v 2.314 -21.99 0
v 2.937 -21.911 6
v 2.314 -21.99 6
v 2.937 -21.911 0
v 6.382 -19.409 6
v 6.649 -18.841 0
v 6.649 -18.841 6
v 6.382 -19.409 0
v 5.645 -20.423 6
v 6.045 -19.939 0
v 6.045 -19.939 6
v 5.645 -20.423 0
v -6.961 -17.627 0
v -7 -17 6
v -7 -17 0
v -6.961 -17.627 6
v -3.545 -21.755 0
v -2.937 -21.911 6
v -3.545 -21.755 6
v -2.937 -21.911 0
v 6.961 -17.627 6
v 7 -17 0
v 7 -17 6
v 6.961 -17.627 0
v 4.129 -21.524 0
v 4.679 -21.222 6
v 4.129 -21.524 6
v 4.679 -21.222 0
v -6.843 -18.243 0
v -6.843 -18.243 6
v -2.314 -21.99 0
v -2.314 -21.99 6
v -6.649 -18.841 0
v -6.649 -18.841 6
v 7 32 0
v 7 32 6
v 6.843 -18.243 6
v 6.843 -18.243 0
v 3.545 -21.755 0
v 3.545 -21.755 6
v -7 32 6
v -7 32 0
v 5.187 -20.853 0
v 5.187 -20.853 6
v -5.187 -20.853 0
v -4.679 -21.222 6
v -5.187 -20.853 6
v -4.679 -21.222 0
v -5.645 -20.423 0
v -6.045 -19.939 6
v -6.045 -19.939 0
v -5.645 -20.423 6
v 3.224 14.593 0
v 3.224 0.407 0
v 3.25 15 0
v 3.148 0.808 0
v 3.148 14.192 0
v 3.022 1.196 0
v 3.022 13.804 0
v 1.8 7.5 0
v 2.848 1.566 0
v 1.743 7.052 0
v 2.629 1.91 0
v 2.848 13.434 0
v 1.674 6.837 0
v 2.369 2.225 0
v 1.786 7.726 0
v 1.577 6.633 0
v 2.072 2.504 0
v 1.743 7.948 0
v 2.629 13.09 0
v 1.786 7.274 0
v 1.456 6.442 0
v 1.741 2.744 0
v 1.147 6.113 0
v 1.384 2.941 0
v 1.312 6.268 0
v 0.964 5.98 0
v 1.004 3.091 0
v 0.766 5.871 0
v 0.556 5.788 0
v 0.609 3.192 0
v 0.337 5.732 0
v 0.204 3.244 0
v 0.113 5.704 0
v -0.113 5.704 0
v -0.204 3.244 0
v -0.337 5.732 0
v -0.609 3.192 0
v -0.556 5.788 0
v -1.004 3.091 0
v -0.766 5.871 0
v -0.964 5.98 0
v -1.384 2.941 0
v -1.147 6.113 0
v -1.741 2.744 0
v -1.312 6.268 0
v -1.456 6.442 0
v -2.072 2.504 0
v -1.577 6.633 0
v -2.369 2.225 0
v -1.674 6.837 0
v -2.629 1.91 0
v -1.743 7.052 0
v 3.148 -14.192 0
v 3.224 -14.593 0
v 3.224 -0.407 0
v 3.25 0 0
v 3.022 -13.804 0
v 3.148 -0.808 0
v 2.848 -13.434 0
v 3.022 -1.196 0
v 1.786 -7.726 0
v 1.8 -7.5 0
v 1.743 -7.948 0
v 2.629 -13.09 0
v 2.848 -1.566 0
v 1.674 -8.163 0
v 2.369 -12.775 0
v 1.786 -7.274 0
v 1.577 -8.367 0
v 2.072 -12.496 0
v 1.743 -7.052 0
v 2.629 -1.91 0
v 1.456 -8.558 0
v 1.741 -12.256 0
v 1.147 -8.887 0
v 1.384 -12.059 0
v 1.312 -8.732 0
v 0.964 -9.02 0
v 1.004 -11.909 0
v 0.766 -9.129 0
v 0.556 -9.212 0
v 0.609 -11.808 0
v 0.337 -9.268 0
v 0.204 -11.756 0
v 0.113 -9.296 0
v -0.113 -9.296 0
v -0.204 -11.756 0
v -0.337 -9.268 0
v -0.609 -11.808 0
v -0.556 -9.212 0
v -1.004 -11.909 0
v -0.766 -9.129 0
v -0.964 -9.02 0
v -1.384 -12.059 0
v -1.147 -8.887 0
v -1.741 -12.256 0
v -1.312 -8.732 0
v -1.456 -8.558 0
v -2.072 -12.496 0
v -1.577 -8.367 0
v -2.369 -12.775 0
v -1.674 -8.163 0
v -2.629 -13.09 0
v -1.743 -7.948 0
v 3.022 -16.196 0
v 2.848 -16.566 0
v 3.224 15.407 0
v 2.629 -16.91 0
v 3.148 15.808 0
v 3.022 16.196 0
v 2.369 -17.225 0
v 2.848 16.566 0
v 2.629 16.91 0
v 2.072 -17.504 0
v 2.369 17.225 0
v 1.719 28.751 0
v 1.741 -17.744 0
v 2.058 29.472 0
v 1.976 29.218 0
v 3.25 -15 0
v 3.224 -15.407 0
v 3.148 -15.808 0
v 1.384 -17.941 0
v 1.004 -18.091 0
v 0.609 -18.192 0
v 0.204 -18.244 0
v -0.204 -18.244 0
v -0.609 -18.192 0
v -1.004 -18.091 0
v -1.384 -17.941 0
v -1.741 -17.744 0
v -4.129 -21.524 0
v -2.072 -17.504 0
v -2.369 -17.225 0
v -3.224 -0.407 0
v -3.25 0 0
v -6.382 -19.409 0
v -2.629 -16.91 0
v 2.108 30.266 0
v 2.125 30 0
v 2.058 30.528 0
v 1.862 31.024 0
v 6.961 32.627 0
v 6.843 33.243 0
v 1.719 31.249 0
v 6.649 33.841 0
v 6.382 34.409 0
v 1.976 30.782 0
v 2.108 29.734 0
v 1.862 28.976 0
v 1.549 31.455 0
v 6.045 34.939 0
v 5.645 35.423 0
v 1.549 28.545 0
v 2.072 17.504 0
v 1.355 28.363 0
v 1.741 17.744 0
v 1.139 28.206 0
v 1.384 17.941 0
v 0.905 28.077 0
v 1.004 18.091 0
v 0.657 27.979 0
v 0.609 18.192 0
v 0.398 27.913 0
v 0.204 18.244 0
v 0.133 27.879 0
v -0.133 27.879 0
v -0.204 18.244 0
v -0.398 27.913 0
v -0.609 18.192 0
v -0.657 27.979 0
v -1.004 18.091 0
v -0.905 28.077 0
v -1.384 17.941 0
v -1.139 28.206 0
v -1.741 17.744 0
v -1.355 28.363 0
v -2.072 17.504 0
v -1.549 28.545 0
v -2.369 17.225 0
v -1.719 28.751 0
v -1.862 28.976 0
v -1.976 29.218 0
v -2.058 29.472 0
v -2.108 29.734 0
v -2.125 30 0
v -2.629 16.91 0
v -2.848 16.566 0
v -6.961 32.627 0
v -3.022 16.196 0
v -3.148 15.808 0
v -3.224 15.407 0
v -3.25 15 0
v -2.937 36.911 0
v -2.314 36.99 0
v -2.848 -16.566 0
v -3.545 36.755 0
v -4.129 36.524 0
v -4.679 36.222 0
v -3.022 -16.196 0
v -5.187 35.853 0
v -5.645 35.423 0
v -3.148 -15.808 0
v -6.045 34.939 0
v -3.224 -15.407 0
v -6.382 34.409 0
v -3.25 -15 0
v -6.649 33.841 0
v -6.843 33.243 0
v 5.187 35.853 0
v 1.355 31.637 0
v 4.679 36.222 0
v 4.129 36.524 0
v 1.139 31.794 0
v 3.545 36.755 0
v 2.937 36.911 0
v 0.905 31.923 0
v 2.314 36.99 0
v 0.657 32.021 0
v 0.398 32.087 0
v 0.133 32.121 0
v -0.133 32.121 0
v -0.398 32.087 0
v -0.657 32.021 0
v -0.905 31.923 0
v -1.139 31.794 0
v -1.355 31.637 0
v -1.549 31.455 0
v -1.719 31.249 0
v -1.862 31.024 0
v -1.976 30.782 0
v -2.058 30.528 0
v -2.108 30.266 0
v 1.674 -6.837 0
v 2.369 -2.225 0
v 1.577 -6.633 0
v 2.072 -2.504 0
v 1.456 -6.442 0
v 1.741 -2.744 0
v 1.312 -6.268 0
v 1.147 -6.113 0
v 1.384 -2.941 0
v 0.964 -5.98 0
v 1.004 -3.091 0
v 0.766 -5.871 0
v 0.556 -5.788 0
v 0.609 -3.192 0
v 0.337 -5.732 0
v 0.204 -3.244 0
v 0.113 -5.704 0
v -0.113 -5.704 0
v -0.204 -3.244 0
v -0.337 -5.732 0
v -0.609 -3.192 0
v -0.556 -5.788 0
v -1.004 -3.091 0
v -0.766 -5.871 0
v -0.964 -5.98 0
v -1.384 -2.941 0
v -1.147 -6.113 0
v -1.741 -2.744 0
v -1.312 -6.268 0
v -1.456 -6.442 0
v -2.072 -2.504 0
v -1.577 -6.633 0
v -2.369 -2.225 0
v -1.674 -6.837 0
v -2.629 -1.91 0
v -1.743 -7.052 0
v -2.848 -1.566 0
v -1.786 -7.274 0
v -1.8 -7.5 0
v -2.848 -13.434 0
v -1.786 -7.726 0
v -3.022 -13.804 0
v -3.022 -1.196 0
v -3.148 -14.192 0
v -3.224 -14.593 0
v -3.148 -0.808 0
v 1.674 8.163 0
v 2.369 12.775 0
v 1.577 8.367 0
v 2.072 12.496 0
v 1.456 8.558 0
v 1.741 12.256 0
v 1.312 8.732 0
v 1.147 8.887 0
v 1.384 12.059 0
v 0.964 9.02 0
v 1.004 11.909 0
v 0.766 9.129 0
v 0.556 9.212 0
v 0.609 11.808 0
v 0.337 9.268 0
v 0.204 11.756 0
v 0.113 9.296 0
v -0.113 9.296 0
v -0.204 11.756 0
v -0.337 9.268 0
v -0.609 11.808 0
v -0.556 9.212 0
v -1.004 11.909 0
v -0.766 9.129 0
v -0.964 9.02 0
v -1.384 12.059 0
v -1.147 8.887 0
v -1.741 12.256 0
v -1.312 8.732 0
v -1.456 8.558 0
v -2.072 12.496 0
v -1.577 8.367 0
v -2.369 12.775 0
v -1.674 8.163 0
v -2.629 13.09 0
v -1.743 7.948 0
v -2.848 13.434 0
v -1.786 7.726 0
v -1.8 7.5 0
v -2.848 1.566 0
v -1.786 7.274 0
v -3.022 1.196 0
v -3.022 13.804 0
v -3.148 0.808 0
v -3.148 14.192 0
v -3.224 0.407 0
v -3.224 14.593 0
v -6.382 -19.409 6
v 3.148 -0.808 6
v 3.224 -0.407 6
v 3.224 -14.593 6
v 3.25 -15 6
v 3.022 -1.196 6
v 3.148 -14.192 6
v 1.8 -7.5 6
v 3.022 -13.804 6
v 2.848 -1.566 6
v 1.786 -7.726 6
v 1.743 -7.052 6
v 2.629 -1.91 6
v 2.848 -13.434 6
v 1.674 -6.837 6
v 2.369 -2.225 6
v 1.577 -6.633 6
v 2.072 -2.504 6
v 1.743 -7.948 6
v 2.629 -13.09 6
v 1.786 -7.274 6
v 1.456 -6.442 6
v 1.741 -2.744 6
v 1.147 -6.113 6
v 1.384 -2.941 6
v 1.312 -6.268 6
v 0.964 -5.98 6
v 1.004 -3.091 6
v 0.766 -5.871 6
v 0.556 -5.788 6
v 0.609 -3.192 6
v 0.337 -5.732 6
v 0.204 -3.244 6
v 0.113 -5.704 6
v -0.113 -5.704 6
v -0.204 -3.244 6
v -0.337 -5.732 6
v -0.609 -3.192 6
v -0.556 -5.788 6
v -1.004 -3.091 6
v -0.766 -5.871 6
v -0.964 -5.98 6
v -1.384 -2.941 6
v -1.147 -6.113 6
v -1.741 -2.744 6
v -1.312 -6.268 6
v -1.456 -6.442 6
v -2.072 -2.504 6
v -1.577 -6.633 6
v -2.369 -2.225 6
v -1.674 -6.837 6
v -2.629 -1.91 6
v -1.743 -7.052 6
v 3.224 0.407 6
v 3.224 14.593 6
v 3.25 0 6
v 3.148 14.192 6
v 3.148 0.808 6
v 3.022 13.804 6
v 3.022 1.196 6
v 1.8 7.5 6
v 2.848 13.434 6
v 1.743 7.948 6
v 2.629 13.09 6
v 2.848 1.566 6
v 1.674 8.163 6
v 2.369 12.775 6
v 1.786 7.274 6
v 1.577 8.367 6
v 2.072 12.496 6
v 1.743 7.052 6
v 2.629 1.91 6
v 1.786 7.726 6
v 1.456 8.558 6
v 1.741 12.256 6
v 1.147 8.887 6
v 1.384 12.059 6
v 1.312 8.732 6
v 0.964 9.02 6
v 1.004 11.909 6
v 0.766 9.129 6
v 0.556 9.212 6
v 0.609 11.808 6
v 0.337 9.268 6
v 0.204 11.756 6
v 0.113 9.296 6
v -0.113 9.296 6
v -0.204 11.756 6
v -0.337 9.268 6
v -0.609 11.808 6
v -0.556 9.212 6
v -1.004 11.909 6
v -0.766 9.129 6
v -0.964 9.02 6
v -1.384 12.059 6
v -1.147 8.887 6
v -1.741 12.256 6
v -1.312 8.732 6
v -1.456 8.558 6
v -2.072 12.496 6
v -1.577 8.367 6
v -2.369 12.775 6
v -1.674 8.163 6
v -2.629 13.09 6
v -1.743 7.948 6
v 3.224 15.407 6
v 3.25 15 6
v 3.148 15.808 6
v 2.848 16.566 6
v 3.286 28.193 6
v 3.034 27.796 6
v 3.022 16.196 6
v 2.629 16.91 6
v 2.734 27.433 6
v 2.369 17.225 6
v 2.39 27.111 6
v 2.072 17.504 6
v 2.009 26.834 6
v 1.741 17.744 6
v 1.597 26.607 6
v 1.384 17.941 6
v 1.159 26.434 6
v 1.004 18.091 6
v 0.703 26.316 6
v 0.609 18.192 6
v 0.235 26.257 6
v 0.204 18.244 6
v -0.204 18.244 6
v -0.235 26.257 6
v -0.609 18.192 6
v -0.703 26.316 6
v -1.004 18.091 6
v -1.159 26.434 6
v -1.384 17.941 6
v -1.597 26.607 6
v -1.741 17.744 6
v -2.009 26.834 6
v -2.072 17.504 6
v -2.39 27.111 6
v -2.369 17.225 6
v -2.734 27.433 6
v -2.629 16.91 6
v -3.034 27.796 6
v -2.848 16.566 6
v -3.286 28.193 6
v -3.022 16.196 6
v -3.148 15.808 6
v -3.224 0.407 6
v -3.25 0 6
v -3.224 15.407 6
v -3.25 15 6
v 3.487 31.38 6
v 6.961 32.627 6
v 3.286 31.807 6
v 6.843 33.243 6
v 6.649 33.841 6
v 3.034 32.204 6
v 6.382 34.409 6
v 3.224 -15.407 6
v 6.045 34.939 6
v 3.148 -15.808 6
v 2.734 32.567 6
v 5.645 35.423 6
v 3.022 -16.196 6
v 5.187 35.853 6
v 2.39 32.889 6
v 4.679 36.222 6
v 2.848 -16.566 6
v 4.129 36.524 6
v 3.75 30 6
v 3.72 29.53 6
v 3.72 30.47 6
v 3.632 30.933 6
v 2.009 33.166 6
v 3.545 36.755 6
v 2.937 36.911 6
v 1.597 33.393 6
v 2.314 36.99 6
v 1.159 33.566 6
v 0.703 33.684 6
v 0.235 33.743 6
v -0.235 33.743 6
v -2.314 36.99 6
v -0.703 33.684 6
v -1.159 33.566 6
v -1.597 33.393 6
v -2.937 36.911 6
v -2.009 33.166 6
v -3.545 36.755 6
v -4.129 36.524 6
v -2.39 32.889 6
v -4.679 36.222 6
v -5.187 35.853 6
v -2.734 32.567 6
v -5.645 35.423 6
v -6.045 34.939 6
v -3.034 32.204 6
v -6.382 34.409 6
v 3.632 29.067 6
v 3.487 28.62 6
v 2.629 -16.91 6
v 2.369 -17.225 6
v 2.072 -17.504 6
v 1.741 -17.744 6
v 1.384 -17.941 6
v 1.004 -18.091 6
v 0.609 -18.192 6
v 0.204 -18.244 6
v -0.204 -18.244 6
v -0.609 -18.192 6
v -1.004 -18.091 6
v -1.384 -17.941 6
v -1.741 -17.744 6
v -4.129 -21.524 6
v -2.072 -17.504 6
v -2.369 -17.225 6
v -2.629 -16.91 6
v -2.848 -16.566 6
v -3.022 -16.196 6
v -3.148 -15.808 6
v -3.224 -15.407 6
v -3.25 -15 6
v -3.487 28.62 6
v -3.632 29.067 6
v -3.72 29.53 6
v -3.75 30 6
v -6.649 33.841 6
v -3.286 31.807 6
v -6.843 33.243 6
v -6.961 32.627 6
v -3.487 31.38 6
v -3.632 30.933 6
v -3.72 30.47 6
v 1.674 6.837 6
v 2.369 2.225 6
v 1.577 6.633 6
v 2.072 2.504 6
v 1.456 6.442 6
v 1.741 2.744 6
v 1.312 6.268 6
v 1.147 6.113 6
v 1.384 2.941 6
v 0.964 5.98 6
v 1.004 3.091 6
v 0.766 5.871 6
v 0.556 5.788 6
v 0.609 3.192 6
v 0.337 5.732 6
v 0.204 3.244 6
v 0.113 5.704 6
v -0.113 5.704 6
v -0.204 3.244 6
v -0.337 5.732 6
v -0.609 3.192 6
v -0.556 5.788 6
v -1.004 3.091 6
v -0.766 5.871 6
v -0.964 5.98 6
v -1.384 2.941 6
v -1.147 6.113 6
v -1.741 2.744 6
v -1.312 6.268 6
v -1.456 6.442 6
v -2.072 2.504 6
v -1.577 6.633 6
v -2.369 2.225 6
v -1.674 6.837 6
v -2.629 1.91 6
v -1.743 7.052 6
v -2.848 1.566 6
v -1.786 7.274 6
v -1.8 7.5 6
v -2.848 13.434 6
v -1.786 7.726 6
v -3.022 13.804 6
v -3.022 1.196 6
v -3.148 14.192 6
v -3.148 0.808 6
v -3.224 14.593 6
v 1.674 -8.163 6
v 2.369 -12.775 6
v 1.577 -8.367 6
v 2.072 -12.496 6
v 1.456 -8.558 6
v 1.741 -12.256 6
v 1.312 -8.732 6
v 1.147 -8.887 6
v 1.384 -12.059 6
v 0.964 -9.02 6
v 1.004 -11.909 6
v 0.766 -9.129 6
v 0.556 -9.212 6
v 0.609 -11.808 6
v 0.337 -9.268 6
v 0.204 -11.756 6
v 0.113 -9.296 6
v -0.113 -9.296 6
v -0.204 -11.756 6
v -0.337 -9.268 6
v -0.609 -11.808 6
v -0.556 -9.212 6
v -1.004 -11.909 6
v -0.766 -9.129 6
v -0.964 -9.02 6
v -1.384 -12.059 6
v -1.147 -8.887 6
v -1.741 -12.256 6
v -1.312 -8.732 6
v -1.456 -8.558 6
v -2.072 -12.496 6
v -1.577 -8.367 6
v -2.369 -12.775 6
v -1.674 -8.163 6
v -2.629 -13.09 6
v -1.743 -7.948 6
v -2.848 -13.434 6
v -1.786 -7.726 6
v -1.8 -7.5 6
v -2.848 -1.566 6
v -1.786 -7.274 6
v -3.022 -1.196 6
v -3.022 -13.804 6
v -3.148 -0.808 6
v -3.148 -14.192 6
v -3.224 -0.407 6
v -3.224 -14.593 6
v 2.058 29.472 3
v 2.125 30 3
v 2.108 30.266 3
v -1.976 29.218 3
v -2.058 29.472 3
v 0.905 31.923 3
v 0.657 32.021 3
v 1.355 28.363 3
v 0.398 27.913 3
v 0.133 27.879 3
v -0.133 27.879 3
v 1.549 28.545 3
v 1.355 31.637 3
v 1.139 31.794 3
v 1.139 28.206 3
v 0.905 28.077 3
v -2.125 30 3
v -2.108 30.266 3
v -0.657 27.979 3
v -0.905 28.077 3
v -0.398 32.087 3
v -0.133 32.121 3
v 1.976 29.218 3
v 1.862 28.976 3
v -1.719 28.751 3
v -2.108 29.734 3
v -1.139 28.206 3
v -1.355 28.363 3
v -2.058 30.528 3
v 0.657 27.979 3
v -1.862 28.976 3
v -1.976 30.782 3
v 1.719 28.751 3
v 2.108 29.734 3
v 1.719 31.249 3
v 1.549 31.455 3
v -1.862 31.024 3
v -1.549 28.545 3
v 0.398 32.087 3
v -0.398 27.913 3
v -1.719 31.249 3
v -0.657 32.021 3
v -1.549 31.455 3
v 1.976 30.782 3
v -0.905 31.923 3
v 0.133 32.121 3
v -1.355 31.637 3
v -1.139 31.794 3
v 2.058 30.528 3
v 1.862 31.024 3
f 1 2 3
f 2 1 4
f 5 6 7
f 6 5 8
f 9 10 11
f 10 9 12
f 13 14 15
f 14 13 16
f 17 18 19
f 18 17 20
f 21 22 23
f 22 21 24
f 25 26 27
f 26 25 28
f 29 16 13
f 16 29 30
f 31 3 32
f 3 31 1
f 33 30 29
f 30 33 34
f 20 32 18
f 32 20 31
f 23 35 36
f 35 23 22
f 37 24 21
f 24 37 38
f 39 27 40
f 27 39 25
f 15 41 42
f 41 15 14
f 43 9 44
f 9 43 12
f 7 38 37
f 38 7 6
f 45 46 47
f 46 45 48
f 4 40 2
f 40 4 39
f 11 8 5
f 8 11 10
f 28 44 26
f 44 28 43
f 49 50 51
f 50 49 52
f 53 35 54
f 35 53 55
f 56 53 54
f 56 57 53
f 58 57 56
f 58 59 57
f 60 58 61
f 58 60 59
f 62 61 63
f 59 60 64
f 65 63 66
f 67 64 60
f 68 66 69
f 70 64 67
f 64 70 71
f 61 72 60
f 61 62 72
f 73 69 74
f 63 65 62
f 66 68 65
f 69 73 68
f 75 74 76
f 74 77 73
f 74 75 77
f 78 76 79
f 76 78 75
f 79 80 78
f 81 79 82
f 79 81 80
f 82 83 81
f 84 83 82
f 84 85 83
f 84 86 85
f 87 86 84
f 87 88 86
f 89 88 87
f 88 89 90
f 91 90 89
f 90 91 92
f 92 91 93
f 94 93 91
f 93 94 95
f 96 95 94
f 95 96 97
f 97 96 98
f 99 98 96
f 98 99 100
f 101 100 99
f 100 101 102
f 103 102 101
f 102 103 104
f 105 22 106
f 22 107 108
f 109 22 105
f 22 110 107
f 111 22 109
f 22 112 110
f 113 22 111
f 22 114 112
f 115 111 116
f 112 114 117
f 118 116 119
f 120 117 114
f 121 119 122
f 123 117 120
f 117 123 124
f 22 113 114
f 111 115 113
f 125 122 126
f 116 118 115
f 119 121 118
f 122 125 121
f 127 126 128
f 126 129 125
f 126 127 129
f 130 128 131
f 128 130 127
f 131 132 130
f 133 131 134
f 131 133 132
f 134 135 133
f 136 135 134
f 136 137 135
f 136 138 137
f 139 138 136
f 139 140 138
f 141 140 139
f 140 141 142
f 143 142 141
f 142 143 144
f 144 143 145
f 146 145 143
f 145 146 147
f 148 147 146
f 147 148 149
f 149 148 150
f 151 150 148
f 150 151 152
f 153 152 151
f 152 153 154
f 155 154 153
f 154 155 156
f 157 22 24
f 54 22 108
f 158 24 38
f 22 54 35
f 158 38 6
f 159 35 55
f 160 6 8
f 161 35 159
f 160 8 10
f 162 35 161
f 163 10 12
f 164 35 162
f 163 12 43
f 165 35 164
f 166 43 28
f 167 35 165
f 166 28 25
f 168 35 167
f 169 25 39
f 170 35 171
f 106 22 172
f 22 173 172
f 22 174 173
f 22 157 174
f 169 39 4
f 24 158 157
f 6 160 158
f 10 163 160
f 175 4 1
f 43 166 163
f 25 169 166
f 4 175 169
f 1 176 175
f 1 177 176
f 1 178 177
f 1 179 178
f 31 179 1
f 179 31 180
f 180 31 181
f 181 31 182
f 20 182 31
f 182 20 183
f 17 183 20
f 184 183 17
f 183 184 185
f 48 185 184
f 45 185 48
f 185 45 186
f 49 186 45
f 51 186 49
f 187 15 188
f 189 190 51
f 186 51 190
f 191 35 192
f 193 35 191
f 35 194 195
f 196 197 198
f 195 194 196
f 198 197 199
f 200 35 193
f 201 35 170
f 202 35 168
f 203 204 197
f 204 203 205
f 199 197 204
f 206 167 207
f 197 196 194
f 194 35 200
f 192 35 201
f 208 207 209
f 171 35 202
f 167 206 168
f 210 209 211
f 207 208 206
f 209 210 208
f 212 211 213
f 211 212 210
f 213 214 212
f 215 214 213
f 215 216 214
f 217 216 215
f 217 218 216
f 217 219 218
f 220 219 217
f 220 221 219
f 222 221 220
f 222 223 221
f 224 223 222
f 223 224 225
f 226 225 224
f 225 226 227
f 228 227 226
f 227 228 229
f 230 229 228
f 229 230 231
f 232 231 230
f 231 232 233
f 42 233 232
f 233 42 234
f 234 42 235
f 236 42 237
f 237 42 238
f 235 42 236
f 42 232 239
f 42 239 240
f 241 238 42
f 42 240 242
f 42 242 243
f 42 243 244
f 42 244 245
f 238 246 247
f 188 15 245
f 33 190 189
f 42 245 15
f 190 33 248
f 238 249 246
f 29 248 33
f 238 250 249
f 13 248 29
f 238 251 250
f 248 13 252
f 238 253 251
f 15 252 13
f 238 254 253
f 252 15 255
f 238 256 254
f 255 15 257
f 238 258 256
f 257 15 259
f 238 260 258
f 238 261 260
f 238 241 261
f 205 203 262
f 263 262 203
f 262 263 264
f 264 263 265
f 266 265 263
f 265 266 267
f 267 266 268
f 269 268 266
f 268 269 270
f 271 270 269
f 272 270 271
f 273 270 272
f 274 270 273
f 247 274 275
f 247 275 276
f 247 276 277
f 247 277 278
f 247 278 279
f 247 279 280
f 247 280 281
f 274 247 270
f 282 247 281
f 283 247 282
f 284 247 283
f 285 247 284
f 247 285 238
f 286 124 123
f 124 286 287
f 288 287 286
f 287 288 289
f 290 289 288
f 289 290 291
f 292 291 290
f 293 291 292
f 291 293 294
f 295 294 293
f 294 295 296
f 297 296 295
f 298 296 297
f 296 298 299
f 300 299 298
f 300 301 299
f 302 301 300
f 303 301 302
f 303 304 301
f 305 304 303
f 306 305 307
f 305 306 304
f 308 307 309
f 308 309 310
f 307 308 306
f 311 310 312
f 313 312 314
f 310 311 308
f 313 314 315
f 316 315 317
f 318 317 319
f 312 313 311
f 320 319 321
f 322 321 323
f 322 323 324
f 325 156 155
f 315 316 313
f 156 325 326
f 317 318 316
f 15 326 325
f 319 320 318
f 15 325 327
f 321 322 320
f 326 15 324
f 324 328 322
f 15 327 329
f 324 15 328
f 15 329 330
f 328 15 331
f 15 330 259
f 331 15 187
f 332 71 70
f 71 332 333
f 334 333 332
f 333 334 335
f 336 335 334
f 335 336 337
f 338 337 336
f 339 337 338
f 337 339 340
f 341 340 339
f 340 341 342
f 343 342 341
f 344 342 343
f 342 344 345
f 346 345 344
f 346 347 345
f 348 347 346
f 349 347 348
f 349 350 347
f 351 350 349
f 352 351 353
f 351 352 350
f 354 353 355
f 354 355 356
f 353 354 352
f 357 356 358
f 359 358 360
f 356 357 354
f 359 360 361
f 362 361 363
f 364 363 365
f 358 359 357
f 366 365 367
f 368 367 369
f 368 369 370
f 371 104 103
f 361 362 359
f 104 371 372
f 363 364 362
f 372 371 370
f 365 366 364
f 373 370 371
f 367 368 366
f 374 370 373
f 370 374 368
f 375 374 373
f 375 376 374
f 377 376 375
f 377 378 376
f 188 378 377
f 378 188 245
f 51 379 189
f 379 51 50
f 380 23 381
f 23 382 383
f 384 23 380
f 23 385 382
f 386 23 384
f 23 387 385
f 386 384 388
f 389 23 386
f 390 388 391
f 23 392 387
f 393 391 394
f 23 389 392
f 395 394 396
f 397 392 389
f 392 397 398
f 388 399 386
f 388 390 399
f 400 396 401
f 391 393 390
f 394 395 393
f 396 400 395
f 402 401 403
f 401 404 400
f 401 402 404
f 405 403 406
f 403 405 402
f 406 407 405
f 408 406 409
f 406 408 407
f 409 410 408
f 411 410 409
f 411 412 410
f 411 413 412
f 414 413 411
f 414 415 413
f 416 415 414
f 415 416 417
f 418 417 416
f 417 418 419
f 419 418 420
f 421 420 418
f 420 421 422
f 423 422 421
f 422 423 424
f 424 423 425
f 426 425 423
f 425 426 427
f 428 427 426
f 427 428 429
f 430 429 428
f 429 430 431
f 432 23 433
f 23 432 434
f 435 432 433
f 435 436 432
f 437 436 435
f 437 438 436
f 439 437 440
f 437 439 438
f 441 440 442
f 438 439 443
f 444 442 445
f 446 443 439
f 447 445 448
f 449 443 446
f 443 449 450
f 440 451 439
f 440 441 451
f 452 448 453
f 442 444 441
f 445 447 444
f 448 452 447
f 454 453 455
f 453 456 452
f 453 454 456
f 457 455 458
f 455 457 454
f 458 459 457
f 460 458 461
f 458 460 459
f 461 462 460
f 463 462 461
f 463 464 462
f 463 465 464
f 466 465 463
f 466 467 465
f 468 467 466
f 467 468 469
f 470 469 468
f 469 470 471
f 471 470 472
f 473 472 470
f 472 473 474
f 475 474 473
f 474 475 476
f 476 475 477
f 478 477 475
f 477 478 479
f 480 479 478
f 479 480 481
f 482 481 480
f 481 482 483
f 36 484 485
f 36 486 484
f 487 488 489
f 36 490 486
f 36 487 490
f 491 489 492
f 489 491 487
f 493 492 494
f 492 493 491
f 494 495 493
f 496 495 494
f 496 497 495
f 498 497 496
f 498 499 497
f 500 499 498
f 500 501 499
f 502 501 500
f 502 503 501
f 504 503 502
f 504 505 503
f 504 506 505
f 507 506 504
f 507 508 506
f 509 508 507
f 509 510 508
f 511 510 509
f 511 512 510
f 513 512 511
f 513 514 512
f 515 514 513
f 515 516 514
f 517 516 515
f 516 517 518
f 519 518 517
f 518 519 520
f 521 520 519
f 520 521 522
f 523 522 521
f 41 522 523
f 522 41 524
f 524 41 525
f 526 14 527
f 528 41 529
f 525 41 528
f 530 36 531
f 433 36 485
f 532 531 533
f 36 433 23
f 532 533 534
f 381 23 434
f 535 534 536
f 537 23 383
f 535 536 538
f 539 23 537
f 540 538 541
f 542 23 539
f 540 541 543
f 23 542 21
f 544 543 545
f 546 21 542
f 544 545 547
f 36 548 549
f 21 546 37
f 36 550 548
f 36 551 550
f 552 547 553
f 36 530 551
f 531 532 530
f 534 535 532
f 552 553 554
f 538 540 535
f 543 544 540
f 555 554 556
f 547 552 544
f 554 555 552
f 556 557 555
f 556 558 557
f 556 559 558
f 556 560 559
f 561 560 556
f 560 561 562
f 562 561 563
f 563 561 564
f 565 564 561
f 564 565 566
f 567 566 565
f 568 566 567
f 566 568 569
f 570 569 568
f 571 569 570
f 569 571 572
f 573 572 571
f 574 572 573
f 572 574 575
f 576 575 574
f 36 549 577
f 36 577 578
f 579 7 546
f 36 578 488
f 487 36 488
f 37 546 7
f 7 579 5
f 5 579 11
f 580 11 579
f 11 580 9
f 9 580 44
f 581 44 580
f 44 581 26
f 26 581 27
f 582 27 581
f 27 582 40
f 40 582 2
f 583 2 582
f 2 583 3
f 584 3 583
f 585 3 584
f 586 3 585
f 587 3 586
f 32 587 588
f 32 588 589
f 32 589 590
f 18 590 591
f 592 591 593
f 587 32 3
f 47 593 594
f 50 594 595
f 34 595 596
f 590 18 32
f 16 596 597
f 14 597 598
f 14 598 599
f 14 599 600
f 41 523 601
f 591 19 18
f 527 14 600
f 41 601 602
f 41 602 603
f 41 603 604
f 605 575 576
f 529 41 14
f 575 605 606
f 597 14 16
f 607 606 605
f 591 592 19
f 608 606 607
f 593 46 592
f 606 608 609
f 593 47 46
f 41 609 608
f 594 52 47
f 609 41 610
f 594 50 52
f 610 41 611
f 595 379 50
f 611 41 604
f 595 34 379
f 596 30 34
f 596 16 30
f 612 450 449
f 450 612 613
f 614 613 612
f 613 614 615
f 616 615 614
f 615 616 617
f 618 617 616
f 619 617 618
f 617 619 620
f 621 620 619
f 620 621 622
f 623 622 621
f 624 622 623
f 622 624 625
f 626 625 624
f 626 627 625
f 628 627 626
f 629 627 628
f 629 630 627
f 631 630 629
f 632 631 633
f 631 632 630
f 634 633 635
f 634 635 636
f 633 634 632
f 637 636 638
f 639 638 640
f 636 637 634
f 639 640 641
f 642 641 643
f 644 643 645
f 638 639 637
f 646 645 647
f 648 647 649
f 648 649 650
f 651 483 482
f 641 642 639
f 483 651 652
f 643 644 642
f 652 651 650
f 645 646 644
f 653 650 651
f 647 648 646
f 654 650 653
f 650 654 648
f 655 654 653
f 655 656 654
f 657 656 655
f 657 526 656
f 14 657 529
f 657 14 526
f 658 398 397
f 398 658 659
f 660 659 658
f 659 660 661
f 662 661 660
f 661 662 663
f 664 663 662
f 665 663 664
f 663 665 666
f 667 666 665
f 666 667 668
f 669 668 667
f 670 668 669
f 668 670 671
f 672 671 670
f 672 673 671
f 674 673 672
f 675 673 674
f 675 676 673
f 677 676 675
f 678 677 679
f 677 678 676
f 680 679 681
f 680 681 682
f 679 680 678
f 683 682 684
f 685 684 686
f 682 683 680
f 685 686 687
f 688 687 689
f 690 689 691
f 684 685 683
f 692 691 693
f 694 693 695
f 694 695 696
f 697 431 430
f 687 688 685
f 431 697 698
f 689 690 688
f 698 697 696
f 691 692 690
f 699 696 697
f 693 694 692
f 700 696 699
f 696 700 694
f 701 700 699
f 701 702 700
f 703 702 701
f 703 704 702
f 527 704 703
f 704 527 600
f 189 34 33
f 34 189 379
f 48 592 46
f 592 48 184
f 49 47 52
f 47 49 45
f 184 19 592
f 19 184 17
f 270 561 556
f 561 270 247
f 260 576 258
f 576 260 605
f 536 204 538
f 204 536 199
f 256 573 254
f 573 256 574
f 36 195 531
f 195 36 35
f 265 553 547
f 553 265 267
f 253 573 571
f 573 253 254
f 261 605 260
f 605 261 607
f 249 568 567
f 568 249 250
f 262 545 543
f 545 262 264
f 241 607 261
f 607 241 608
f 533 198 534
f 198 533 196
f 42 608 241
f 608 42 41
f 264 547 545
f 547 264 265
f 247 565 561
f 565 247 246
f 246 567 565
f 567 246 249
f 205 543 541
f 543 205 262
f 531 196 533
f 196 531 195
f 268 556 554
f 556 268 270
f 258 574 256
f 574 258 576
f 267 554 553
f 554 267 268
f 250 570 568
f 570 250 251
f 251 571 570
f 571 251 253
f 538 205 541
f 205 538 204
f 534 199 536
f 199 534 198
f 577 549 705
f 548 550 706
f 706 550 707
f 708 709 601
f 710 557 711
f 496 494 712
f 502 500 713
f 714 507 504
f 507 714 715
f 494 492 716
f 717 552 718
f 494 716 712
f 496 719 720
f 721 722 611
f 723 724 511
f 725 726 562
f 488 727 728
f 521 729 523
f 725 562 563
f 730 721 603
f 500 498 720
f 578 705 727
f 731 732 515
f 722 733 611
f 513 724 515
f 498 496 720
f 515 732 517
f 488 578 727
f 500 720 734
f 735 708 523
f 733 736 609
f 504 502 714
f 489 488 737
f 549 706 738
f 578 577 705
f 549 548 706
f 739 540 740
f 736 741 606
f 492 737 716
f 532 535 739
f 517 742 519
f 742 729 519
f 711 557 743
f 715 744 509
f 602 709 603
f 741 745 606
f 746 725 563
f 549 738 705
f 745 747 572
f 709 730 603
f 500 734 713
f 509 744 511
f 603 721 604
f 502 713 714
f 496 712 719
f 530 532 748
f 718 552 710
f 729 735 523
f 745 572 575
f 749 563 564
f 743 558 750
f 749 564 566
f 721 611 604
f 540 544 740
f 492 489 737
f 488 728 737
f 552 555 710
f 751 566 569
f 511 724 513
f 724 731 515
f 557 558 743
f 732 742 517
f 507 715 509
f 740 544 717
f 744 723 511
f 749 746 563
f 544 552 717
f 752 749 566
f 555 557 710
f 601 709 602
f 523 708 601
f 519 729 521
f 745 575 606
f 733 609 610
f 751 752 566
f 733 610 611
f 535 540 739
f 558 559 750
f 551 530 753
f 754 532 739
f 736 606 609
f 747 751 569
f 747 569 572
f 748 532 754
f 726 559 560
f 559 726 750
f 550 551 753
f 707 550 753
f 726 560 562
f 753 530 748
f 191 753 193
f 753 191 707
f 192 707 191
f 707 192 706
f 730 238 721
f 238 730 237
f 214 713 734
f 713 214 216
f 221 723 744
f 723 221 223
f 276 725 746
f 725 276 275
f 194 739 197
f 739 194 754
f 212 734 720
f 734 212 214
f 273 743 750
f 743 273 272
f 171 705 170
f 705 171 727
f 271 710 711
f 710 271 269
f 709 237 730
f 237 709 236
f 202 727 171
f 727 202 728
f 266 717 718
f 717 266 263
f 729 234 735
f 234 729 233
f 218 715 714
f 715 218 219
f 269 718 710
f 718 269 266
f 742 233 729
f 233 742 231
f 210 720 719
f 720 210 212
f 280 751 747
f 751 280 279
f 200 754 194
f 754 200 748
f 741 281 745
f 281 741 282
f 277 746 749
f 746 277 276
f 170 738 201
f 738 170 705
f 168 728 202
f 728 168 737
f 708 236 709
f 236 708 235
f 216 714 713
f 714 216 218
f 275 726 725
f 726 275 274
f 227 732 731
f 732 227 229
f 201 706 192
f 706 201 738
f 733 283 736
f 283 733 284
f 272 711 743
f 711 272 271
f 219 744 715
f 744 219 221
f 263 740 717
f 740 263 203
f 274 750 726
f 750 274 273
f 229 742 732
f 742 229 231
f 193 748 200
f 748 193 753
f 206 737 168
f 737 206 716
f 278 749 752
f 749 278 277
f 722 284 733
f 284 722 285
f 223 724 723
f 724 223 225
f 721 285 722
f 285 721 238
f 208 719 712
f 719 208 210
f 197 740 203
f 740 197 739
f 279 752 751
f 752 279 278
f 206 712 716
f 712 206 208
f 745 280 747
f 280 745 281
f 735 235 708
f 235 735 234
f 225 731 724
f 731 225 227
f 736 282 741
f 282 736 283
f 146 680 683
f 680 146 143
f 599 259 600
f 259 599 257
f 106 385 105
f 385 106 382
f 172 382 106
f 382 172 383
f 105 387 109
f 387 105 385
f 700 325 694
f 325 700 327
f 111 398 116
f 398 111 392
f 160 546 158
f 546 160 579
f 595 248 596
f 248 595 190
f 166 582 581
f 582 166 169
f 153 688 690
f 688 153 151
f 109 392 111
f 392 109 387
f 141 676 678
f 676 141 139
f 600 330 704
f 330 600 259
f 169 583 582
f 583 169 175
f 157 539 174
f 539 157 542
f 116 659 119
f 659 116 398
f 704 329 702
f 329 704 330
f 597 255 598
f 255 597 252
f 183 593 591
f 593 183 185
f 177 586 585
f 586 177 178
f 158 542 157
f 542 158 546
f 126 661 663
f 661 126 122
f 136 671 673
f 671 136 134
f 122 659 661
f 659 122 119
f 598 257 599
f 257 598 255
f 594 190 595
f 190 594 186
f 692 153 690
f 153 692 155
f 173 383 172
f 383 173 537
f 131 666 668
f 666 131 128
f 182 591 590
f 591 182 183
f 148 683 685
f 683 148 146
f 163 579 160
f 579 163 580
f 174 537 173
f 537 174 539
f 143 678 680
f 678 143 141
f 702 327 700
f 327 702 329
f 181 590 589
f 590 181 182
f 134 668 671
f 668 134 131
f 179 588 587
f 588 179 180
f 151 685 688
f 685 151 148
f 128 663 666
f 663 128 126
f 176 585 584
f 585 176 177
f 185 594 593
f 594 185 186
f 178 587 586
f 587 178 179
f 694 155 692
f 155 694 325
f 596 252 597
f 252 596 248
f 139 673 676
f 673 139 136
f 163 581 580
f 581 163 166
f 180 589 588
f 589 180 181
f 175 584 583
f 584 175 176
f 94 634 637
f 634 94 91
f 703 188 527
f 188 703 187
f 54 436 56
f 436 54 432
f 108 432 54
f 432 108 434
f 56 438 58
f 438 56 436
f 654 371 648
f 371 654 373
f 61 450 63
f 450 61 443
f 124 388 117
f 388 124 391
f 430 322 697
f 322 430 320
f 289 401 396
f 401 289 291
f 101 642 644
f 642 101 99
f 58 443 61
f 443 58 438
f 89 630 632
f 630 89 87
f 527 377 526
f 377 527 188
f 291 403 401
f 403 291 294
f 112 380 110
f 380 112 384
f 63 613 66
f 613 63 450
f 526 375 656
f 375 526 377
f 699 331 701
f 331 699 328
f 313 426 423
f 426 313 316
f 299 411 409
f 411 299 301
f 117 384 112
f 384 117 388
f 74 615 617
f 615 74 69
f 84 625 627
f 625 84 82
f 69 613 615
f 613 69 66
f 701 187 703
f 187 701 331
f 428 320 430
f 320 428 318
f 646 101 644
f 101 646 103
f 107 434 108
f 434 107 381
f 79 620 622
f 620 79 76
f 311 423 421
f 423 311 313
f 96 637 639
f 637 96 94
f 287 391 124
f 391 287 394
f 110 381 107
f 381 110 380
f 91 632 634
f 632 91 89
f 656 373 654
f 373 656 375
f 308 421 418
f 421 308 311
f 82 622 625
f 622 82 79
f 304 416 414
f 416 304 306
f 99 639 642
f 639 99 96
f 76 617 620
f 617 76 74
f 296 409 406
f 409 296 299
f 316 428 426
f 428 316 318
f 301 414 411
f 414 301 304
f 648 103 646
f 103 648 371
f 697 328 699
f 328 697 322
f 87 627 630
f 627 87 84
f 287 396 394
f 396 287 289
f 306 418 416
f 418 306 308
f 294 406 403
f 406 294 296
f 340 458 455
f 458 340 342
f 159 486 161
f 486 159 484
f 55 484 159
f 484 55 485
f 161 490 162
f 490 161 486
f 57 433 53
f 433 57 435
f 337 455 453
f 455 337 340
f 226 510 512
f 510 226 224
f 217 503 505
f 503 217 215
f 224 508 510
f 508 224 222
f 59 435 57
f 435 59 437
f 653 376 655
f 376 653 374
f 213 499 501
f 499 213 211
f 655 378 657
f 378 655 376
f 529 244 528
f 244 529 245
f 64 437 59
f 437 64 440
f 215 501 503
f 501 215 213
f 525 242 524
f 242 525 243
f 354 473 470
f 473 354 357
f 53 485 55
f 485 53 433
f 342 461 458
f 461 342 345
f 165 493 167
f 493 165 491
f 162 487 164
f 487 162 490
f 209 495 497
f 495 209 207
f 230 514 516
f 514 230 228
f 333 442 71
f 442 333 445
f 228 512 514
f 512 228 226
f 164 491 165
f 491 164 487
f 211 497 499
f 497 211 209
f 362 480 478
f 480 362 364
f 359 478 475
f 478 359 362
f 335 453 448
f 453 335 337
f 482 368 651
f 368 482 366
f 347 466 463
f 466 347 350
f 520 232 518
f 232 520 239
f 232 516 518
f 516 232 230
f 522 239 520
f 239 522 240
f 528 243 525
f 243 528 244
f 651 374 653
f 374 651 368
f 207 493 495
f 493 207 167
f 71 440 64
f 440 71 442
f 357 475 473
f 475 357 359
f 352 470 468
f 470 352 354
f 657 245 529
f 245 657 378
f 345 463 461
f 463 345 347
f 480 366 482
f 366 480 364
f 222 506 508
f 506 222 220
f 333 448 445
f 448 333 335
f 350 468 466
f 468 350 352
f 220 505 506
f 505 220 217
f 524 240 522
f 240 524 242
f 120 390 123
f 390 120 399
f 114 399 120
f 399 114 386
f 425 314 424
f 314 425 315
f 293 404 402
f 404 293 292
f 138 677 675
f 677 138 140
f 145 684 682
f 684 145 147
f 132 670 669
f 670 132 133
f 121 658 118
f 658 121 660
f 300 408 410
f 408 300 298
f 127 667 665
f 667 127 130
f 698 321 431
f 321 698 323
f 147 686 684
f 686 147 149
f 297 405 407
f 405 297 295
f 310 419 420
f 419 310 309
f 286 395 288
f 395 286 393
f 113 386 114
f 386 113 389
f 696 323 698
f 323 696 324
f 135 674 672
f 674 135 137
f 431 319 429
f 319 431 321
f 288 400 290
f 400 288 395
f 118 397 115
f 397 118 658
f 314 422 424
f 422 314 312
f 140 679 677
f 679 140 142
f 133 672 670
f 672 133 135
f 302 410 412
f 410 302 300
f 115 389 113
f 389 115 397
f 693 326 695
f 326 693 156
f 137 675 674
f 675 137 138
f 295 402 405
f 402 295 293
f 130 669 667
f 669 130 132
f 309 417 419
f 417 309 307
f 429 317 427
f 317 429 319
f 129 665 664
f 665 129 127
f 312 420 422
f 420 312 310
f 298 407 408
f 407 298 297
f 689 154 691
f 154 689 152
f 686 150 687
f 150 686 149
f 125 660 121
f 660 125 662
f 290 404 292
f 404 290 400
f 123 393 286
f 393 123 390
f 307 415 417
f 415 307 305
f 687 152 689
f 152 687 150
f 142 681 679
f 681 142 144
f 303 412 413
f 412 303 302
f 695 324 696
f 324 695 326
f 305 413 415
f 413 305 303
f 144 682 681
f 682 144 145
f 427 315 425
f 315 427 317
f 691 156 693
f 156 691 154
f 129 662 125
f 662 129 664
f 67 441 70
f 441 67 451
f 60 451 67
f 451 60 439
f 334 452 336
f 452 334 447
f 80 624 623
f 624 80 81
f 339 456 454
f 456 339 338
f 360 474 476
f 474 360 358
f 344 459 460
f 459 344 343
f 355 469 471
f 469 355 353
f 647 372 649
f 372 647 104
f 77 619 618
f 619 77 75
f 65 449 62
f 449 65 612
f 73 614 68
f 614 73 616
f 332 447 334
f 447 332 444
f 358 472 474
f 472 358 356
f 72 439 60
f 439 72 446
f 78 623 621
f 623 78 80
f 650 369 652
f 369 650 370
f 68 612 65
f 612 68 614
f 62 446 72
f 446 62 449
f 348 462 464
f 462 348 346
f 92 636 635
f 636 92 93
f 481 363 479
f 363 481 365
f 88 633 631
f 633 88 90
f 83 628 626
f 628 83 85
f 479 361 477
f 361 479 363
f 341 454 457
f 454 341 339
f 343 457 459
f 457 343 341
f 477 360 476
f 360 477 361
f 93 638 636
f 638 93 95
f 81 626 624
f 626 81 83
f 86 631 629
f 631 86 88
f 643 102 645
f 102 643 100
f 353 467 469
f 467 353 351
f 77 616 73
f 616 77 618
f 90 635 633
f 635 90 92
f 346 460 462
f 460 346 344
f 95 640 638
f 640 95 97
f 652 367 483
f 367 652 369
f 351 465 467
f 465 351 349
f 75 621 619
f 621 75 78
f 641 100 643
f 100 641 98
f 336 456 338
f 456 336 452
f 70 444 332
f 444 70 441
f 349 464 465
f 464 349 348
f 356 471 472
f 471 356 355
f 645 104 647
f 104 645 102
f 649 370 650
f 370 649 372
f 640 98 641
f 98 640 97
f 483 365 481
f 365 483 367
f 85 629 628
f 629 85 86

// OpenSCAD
$fn = 50;


difference() {
	union() {
		hull() {
			translate(v = [-2.0000000000, 17.0000000000, 0]) {
				cylinder(h = 6, r = 5);
			}
			translate(v = [2.0000000000, 17.0000000000, 0]) {
				cylinder(h = 6, r = 5);
			}
			translate(v = [-2.0000000000, -17.0000000000, 0]) {
				cylinder(h = 6, r = 5);
			}
			translate(v = [2.0000000000, -17.0000000000, 0]) {
				cylinder(h = 6, r = 5);
			}
		}
		translate(v = [0.0000000000, 22.5000000000, 0]) {
			hull() {
				translate(v = [-2.0000000000, 9.5000000000, 0]) {
					cylinder(h = 6, r = 5);
				}
				translate(v = [2.0000000000, 9.5000000000, 0]) {
					cylinder(h = 6, r = 5);
				}
				translate(v = [-2.0000000000, -9.5000000000, 0]) {
					cylinder(h = 6, r = 5);
				}
				translate(v = [2.0000000000, -9.5000000000, 0]) {
					cylinder(h = 6, r = 5);
				}
			}
		}
		translate(v = [0.0000000000, 22.5000000000, 0]) {
			hull() {
				translate(v = [-2.0000000000, 9.5000000000, 0]) {
					cylinder(h = 6, r = 5);
				}
				translate(v = [2.0000000000, 9.5000000000, 0]) {
					cylinder(h = 6, r = 5);
				}
				translate(v = [-2.0000000000, -9.5000000000, 0]) {
					cylinder(h = 6, r = 5);
				}
				translate(v = [2.0000000000, -9.5000000000, 0]) {
					cylinder(h = 6, r = 5);
				}
			}
		}
	}
	union() {
		translate(v = [0.0000000000, 30.0000000000, 6]) {
			rotate(a = [0, 0, 0]) {
				difference() {
					union() {
						#translate(v = [0, 0, -6.0000000000]) {
							cylinder(h = 6, r = 2.0000000000);
						}
						#translate(v = [0, 0, -3]) {
							cylinder(h = 3, r1 = 2.1250000000, r2 = 3.7500000000);
						}
						#translate(v = [0, 0, -6.0000000000]) {
							cylinder(h = 6, r = 2.1250000000);
						}
						#translate(v = [0, 0, -6.0000000000]) {
							cylinder(h = 6, r = 2.0000000000);
						}
					}
					union();
				}
			}
		}
		translate(v = [0.0000000000, 30.0000000000, 6]) {
			rotate(a = [0, 0, 0]) {
				difference() {
					union() {
						#translate(v = [0, 0, -6.0000000000]) {
							cylinder(h = 6, r = 2.0000000000);
						}
						#translate(v = [0, 0, -3]) {
							cylinder(h = 3, r1 = 2.1250000000, r2 = 3.7500000000);
						}
						#translate(v = [0, 0, -6.0000000000]) {
							cylinder(h = 6, r = 2.1250000000);
						}
						#translate(v = [0, 0, -6.0000000000]) {
							cylinder(h = 6, r = 2.0000000000);
						}
					}
					union();
				}
			}
		}
		translate(v = [0.0000000000, -15.0000000000, 0]) {
			translate(v = [0, 0, -100]) {
				cylinder(h = 200, r = 3.2500000000);
			}
		}
		translate(v = [0, 0, -100]) {
			cylinder(h = 200, r = 3.2500000000);
		}
		translate(v = [0.0000000000, 15.0000000000, 0]) {
			translate(v = [0, 0, -100]) {
				cylinder(h = 200, r = 3.2500000000);
			}
		}
		translate(v = [0.0000000000, -15.0000000000, 0]) {
			translate(v = [0, 0, -100]) {
				cylinder(h = 200, r = 1.8000000000);
			}
		}
		translate(v = [0.0000000000, -7.5000000000, 0]) {
			translate(v = [0, 0, -100]) {
				cylinder(h = 200, r = 1.8000000000);
			}
		}
		translate(v = [0, 0, -100]) {
			cylinder(h = 200, r = 1.8000000000);
		}
		translate(v = [0.0000000000, 7.5000000000, 0]) {
			translate(v = [0, 0, -100]) {
				cylinder(h = 200, r = 1.8000000000);
			}
		}
		translate(v = [0.0000000000, 15.0000000000, 0]) {
			translate(v = [0, 0, -100]) {
				cylinder(h = 200, r = 1.8000000000);
			}
		}
	}
}
